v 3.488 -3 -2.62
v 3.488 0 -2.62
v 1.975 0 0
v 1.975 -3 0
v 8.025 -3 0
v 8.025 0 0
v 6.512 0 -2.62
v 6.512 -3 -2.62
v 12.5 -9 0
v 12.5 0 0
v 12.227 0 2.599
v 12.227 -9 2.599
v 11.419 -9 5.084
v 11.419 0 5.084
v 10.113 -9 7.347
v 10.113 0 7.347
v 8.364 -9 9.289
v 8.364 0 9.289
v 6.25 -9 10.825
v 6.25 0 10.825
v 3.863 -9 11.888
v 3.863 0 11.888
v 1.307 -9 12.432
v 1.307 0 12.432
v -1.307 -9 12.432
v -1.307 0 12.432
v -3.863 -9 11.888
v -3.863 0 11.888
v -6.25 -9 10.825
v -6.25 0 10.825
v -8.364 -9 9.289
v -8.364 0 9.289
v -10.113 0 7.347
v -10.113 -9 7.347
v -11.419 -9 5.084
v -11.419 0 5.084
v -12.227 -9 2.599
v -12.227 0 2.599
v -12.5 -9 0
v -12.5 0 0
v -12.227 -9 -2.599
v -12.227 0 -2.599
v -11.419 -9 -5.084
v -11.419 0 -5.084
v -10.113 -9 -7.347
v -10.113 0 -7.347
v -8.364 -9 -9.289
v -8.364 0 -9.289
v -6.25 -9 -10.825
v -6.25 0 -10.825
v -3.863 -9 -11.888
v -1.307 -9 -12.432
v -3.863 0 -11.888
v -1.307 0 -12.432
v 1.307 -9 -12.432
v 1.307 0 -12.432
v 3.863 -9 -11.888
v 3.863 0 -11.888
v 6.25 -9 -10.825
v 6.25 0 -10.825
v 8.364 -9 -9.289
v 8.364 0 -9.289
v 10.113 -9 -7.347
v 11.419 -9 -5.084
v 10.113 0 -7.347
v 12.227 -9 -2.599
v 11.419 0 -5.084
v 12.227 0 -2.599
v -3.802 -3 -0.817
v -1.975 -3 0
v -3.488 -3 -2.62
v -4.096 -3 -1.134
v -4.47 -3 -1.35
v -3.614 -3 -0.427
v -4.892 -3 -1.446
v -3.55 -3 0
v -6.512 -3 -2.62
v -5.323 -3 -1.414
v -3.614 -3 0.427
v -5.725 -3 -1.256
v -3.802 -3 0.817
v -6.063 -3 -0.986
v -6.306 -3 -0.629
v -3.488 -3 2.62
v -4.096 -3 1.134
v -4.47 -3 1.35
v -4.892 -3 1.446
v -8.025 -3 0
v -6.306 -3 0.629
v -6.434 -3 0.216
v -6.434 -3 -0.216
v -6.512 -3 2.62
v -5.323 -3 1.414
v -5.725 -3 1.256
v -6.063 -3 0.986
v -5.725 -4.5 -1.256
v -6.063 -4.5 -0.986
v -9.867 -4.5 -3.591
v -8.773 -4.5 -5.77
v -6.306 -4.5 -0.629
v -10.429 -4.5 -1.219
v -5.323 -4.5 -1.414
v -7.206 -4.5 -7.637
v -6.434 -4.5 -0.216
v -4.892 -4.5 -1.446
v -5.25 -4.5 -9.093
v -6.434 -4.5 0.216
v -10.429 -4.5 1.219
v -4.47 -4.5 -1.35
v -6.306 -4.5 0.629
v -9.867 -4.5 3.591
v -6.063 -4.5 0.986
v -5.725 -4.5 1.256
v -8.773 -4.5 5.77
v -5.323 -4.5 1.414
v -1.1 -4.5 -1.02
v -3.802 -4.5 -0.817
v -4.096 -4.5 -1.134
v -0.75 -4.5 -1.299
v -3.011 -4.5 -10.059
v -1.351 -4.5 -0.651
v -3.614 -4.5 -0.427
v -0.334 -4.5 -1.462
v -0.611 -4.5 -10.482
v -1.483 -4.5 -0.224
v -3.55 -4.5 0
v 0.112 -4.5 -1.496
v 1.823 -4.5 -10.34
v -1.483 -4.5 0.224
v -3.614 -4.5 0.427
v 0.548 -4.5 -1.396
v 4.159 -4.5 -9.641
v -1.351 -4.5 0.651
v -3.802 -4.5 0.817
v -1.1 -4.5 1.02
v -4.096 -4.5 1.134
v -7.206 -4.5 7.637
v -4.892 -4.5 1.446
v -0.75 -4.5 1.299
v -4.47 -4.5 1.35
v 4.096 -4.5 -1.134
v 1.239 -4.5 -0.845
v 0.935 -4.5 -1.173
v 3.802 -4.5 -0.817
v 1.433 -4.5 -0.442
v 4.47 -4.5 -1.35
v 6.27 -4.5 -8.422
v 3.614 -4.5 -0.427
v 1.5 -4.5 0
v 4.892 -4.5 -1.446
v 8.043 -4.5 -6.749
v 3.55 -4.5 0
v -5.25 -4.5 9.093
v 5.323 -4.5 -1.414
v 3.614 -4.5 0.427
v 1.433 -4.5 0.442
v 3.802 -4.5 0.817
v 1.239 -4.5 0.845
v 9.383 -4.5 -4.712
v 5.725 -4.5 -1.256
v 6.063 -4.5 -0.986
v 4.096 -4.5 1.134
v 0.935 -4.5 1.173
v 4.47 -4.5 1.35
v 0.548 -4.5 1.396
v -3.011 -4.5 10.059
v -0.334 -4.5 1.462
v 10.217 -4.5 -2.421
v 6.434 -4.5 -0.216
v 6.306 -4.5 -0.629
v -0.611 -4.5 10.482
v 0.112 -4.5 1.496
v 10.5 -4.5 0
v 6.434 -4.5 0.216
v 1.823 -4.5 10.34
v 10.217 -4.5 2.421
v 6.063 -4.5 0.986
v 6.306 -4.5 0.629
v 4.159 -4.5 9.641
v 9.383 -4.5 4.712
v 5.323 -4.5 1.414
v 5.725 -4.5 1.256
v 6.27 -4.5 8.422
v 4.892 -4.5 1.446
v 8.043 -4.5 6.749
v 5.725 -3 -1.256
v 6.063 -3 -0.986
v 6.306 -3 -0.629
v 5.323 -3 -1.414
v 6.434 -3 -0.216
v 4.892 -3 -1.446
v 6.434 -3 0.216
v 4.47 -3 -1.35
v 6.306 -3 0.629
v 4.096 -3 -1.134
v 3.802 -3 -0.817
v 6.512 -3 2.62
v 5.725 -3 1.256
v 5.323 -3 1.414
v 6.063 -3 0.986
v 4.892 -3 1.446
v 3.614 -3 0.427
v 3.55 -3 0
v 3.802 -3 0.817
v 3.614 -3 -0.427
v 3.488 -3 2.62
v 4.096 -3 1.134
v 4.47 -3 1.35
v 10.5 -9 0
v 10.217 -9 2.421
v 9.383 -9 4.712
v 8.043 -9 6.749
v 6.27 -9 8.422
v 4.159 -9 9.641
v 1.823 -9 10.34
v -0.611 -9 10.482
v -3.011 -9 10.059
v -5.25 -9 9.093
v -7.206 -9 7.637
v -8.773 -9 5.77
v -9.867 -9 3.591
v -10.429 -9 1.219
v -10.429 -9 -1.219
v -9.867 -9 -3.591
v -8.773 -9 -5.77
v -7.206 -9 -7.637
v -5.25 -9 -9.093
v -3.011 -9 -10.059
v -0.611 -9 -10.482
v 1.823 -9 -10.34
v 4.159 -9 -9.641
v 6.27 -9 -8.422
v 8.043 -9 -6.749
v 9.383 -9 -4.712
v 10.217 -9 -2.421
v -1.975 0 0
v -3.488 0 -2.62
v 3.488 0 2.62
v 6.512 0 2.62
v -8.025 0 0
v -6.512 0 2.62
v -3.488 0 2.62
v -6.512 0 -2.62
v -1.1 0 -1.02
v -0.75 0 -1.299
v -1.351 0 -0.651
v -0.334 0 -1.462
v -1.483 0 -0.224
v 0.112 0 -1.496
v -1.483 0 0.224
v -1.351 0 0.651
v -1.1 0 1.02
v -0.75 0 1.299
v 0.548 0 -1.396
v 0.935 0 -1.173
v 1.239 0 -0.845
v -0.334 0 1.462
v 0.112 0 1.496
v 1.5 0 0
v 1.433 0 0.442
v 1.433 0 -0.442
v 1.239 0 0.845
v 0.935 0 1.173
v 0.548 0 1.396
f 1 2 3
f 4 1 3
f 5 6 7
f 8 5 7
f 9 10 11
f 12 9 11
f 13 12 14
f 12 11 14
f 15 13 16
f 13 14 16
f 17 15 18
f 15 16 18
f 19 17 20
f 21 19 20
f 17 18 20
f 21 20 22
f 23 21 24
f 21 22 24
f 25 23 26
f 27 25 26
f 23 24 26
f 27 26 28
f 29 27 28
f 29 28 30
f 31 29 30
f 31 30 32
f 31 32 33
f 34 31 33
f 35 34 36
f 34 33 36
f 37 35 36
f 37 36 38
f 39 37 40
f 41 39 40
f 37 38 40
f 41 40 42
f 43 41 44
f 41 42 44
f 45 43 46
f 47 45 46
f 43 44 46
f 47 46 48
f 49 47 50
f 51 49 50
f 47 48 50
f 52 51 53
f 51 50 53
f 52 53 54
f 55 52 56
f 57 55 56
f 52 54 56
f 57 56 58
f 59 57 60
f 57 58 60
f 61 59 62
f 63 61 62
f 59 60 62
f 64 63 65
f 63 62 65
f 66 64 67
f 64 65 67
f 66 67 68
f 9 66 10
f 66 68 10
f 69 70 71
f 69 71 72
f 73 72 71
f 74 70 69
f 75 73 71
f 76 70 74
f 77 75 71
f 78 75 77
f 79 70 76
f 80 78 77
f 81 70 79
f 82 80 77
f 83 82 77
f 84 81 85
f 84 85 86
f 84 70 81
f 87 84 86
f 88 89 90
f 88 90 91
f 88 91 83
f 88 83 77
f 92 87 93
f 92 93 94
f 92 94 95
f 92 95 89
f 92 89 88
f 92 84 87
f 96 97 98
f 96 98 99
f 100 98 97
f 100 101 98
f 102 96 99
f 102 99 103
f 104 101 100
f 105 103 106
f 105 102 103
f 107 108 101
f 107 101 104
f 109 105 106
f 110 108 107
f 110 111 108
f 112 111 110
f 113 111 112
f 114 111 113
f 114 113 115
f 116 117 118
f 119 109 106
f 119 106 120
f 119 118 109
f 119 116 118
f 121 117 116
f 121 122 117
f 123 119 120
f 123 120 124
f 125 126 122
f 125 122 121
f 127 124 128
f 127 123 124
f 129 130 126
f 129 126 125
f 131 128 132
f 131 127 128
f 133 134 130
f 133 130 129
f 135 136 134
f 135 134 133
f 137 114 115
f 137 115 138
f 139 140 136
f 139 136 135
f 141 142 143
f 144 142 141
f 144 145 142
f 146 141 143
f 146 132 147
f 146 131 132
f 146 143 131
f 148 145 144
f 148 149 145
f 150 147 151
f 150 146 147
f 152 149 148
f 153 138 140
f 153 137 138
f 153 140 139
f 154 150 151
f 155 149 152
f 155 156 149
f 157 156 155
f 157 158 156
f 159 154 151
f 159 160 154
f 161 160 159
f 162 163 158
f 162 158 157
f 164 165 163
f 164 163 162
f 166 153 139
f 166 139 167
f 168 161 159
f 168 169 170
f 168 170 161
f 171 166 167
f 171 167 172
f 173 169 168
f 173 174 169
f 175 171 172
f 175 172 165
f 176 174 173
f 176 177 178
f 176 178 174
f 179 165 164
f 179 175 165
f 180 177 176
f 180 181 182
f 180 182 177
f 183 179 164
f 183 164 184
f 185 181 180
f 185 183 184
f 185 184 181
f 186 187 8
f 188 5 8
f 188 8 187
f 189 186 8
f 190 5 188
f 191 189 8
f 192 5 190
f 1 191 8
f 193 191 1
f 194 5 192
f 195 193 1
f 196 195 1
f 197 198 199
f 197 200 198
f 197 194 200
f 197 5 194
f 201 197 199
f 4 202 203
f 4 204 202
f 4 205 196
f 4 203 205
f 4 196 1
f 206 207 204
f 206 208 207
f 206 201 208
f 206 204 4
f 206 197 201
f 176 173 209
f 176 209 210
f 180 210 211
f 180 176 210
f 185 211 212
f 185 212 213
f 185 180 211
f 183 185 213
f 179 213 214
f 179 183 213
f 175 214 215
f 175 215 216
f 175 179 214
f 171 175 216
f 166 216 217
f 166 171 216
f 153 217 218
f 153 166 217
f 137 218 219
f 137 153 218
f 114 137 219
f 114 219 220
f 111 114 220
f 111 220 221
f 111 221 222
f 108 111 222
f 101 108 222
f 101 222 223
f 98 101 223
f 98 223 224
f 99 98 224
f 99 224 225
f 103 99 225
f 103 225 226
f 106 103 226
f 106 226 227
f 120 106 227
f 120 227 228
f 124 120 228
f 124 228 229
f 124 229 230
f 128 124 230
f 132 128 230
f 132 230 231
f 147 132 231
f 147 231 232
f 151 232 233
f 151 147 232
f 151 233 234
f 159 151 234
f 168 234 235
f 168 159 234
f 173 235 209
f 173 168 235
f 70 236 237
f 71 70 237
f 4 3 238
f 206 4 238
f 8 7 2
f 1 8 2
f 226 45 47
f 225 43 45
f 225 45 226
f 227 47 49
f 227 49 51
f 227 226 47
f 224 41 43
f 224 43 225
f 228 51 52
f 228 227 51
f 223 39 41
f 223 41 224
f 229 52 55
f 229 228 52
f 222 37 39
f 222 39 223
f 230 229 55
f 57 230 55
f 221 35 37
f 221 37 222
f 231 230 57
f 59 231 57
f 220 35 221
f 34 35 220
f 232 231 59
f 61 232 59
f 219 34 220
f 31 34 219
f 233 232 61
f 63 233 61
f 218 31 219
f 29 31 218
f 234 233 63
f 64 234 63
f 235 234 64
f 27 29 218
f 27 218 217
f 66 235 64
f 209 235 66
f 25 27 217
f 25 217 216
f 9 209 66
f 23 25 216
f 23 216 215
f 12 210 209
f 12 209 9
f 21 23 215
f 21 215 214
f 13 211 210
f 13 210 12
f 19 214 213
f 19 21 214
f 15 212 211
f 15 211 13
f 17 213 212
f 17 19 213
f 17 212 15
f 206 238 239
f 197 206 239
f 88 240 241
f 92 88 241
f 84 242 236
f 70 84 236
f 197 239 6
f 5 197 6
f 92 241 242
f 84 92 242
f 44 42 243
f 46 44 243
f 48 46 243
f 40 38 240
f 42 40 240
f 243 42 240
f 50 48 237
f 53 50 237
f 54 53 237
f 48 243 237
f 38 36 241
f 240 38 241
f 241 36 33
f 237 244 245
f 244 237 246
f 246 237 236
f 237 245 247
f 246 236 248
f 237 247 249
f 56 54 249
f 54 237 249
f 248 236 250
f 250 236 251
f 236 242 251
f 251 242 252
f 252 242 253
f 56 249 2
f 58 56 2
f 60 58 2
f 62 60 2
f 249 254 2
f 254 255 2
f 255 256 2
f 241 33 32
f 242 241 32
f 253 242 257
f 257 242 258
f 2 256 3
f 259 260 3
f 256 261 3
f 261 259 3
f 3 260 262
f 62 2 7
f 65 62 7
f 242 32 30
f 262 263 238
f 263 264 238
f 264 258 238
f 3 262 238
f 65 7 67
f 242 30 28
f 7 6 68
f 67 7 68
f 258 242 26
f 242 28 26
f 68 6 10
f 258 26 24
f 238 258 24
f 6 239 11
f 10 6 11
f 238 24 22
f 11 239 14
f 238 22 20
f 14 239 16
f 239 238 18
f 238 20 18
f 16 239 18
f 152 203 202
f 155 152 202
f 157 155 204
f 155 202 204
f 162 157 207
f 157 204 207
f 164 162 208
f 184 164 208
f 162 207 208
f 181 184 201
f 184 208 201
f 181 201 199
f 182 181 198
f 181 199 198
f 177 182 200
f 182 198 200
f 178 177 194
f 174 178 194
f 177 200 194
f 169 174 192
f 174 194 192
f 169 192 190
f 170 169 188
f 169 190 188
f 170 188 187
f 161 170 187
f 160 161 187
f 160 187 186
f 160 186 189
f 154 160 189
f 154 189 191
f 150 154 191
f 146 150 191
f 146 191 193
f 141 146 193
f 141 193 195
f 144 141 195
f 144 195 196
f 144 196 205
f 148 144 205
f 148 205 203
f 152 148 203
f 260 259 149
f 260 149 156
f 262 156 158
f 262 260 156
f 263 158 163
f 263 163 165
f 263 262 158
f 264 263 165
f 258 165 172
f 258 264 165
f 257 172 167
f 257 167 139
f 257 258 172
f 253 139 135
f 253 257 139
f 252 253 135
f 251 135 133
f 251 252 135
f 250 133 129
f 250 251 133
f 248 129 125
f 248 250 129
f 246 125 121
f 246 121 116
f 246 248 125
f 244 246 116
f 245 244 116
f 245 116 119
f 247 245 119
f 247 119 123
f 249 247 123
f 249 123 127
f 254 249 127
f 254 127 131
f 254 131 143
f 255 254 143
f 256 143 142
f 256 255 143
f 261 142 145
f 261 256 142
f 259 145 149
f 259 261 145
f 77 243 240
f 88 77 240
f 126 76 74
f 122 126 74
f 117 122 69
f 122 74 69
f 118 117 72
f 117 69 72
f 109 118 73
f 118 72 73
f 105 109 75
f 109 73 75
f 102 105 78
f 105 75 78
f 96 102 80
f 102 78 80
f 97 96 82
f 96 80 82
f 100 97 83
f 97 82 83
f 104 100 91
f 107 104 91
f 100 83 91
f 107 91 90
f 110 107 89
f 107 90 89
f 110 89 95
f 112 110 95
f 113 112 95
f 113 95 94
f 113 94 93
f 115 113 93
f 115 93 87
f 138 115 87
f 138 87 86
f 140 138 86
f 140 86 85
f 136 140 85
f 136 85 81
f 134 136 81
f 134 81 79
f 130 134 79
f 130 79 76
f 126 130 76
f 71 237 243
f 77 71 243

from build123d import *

# Parameters (mm, degrees)
F0_R     = 10.5
F0_R_2   = 1.5
F1_DEPTH = 4.5
F0_R_3   = 12.5
F2_DEPTH = 9
F4_DEPTH = 4.5
F3_R     = 1.45
F5_DEPTH = 4.5
F6_DEPTH = 3


with BuildPart() as f1:
    # F0 (on Front) → F1 (new body)
    with BuildSketch(Plane.XZ):
        Circle(F0_R)
        Circle(F0_R_2, mode=Mode.SUBTRACT)
    extrude(amount=F1_DEPTH)

    # F0 (on Front) → F2 (join)
    with BuildSketch(Plane.XZ):
        Circle(F0_R_3)
        Circle(F0_R, mode=Mode.SUBTRACT)
    extrude(amount=F2_DEPTH)

    # F3 (on face) → F4 (cut)
    with BuildSketch(Plane(origin=(0, 0, 0), x_dir=(-1, 0, 0), z_dir=(0, 1, 0))):
        with BuildLine():
            ThreePointArc((6.45, 0), (5, 1.45), (3.55, 0))
            ThreePointArc((3.55, 0), (5, -1.45), (6.45, 0))
        make_face()
    extrude(amount=-F4_DEPTH, mode=Mode.SUBTRACT)

    # F3 (on face) → F5 (cut)
    with BuildSketch(Plane(origin=(0, 0, 0), x_dir=(-1, 0, 0), z_dir=(0, 1, 0))):
        with Locations((-5, 0)):
            Circle(F3_R)
    extrude(amount=-F5_DEPTH, mode=Mode.SUBTRACT)

    # F3 (on face) → F6 (cut)
    with BuildSketch(Plane(origin=(0, 0, 0), x_dir=(-1, 0, 0), z_dir=(0, 1, 0))):
        Polygon((-1.975, 0), (-3.4875, 2.619727), (-6.5125, 2.619727), (-8.025, 0), (-6.5125, -2.619727), (-3.4875, -2.619727), align=None)
        with Locations((-5, 0)):
            Circle(F3_R, mode=Mode.SUBTRACT)
        Polygon((3.4875, 2.619727), (1.975, 0), (3.4875, -2.619727), (6.5125, -2.619727), (8.025, 0), (6.5125, 2.619727), align=None)
        with BuildLine():
            ThreePointArc((6.45, 0), (5, -1.45), (3.55, 0))
            ThreePointArc((3.55, 0), (5, 1.45), (6.45, 0))
        make_face(mode=Mode.SUBTRACT)
    extrude(amount=-F6_DEPTH, mode=Mode.SUBTRACT)


solid = f1.part
